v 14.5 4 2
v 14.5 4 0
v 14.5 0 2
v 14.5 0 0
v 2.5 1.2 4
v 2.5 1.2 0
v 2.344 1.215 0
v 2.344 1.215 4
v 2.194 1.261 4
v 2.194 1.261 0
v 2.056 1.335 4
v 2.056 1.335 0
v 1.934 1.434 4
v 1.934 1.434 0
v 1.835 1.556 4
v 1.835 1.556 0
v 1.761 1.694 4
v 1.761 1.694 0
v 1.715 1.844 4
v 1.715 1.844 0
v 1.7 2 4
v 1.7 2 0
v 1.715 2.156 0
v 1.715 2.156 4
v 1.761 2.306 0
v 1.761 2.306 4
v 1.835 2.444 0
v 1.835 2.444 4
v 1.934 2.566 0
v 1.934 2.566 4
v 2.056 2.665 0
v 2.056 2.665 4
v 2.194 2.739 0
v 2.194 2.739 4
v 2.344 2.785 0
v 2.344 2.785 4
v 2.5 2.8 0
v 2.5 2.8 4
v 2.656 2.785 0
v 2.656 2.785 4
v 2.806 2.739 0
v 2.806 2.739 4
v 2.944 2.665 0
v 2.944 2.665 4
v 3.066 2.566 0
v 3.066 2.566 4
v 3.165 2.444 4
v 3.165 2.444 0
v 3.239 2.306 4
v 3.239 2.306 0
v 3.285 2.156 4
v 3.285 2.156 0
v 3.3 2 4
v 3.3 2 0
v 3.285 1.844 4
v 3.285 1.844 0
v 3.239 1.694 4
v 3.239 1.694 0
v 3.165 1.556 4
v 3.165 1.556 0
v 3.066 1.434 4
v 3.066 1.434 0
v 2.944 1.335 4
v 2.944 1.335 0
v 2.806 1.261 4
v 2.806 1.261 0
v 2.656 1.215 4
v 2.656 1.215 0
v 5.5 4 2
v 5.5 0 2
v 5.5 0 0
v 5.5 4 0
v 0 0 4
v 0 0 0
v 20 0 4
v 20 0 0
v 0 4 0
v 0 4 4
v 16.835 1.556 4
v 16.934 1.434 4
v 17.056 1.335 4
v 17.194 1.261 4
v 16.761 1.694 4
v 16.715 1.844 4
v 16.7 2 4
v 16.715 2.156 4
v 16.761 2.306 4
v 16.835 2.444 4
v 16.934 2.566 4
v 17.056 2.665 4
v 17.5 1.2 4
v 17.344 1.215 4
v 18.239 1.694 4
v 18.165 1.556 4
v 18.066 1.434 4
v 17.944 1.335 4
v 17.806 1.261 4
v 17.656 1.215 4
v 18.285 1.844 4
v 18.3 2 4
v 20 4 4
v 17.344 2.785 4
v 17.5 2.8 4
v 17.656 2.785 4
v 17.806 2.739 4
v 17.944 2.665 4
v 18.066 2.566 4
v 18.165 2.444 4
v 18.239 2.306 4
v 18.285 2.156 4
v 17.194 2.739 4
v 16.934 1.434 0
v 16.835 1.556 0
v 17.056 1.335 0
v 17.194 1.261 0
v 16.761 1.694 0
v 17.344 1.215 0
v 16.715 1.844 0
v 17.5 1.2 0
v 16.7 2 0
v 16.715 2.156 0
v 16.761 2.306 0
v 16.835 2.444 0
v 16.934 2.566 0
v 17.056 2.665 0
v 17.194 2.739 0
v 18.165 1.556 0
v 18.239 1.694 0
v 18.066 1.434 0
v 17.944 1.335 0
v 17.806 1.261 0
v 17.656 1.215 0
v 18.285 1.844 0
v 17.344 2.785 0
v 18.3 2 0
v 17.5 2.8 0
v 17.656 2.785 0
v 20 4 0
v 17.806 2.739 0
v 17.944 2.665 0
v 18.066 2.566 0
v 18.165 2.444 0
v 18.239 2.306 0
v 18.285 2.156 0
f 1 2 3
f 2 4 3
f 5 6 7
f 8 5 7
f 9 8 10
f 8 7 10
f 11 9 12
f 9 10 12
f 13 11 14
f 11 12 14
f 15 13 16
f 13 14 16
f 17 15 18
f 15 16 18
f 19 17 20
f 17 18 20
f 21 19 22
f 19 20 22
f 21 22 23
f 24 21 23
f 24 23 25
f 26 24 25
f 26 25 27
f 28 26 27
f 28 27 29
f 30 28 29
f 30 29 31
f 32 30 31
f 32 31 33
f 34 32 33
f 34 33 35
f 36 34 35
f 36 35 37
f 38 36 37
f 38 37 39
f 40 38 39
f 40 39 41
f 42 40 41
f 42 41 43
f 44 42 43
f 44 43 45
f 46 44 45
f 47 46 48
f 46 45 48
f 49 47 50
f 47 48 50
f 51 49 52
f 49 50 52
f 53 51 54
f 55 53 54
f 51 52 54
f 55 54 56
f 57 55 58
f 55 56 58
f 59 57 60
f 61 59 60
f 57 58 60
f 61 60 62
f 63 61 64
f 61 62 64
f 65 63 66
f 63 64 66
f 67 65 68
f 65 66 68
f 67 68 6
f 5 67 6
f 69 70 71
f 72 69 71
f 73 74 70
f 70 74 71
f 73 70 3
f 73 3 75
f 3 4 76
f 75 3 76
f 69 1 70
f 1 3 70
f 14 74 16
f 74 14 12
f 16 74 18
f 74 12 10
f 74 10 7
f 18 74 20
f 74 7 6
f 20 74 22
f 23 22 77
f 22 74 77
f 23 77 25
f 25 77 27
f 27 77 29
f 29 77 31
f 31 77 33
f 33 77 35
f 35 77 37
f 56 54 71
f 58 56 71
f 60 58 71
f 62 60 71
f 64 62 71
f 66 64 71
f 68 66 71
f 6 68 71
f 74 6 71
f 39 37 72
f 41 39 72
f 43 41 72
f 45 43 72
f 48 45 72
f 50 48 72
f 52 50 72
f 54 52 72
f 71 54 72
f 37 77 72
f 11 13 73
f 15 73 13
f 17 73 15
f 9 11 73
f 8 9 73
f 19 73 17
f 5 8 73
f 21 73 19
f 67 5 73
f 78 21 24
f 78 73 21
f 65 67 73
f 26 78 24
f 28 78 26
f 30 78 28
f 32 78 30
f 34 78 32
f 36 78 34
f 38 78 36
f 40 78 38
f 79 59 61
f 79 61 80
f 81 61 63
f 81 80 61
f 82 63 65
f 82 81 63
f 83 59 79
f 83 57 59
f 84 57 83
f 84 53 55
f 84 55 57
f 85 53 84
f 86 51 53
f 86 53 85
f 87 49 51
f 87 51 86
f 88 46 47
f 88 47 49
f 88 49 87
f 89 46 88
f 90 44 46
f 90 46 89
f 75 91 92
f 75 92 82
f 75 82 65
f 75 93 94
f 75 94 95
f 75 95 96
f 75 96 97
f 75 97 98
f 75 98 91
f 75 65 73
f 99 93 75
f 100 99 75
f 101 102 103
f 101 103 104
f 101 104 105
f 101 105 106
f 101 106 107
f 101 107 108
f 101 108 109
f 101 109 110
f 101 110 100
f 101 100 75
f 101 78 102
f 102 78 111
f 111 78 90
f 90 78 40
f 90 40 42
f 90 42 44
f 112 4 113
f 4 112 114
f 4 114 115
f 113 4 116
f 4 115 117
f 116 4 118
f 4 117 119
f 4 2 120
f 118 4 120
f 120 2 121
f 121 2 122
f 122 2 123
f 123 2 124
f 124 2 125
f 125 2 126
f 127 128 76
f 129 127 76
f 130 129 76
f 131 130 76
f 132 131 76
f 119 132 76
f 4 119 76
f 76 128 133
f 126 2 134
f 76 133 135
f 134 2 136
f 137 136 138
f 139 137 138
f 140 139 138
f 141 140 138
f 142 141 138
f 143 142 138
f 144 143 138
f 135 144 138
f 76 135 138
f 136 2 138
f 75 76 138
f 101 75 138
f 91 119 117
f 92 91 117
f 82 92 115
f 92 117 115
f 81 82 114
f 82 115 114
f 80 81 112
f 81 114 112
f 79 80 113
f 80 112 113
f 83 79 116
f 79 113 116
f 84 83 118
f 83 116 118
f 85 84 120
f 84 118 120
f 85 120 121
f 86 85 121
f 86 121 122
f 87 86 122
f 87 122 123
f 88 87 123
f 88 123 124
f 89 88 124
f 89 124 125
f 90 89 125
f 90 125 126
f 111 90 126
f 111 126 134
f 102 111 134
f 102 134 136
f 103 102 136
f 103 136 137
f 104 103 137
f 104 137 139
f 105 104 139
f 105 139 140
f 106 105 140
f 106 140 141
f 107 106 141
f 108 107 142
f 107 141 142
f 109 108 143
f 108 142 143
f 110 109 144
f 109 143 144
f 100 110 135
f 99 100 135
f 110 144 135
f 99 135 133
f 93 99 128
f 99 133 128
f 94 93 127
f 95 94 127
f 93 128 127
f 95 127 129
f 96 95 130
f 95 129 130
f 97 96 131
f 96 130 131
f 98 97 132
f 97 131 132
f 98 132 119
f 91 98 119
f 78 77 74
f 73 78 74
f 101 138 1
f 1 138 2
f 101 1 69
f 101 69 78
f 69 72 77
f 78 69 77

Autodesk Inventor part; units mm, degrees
ref_plane "YZ Plane" through (0, 0, 0) normal (1, 0, 0) x (0, 1, 0)
ref_plane "XZ Plane" through (0, 0, 0) normal (0, 1, 0) x (-1, 0, 0)
ref_plane "XY Plane" through (0, 0, 0) normal (0, 0, 1) x (1, 0, 0)
sketch "Sketch1" plane through (0, 0, 0) normal (0, 0, 1) x (1, 0, 0)
  line L0 (0, 0) -> (20, 0)
  line L1 (20, 0) -> (20, 4)
  line L2 (20, 4) -> (0, 4)
  line L3 (0, 4) -> (0, 0)
  dimension "d0" = 20
  dimension "d1" = 4
extrude "Extrusion1" add sketch "Sketch1" along normal blind 4
sketch "Sketch2" plane through (0, 0, 0) normal (0, -1, 0) x (1, 0, 0)
  line L0 (5.5, 0) -> (14.5, 0)
  line L1 (14.5, 0) -> (14.5, 2)
  line L2 (14.5, 2) -> (5.5, 2)
  line L3 (5.5, 2) -> (5.5, 0)
  line L4 (0, 0) -> (20, 0) construction
  line L5 (10, 0) -> (10, 4) construction
  line L6 (0, 4) -> (20, 4) construction
  dimension "d4" = 9
  dimension "d5" = 2
extrude "Extrusion2" cut sketch "Sketch2" against normal blind 4
sketch "Sketch3" plane through (0, 0, 4) normal (0, 0, 1) x (1, 0, 0)
  line L0 (0, 2) -> (20, 2) construction
  line L1 (20, 0) -> (20, 4) construction
  line L2 (14.5, 4) -> (5.5, 4) construction
  line L3 (10, 4) -> (10, 0) construction
  line L4 (5.5, 0) -> (14.5, 0) construction
  point P0 (0, 0)
  point P1 (2.5, 2)
  point P2 (17.5, 2)
  dimension "d8" = 15
hole "Hole1" at (2.5, 2, 4) at (17.5, 2, 4) direction (0, 0, -1) diameter 1.6 end through all
properties part number "encoder_mounting_clamp"
